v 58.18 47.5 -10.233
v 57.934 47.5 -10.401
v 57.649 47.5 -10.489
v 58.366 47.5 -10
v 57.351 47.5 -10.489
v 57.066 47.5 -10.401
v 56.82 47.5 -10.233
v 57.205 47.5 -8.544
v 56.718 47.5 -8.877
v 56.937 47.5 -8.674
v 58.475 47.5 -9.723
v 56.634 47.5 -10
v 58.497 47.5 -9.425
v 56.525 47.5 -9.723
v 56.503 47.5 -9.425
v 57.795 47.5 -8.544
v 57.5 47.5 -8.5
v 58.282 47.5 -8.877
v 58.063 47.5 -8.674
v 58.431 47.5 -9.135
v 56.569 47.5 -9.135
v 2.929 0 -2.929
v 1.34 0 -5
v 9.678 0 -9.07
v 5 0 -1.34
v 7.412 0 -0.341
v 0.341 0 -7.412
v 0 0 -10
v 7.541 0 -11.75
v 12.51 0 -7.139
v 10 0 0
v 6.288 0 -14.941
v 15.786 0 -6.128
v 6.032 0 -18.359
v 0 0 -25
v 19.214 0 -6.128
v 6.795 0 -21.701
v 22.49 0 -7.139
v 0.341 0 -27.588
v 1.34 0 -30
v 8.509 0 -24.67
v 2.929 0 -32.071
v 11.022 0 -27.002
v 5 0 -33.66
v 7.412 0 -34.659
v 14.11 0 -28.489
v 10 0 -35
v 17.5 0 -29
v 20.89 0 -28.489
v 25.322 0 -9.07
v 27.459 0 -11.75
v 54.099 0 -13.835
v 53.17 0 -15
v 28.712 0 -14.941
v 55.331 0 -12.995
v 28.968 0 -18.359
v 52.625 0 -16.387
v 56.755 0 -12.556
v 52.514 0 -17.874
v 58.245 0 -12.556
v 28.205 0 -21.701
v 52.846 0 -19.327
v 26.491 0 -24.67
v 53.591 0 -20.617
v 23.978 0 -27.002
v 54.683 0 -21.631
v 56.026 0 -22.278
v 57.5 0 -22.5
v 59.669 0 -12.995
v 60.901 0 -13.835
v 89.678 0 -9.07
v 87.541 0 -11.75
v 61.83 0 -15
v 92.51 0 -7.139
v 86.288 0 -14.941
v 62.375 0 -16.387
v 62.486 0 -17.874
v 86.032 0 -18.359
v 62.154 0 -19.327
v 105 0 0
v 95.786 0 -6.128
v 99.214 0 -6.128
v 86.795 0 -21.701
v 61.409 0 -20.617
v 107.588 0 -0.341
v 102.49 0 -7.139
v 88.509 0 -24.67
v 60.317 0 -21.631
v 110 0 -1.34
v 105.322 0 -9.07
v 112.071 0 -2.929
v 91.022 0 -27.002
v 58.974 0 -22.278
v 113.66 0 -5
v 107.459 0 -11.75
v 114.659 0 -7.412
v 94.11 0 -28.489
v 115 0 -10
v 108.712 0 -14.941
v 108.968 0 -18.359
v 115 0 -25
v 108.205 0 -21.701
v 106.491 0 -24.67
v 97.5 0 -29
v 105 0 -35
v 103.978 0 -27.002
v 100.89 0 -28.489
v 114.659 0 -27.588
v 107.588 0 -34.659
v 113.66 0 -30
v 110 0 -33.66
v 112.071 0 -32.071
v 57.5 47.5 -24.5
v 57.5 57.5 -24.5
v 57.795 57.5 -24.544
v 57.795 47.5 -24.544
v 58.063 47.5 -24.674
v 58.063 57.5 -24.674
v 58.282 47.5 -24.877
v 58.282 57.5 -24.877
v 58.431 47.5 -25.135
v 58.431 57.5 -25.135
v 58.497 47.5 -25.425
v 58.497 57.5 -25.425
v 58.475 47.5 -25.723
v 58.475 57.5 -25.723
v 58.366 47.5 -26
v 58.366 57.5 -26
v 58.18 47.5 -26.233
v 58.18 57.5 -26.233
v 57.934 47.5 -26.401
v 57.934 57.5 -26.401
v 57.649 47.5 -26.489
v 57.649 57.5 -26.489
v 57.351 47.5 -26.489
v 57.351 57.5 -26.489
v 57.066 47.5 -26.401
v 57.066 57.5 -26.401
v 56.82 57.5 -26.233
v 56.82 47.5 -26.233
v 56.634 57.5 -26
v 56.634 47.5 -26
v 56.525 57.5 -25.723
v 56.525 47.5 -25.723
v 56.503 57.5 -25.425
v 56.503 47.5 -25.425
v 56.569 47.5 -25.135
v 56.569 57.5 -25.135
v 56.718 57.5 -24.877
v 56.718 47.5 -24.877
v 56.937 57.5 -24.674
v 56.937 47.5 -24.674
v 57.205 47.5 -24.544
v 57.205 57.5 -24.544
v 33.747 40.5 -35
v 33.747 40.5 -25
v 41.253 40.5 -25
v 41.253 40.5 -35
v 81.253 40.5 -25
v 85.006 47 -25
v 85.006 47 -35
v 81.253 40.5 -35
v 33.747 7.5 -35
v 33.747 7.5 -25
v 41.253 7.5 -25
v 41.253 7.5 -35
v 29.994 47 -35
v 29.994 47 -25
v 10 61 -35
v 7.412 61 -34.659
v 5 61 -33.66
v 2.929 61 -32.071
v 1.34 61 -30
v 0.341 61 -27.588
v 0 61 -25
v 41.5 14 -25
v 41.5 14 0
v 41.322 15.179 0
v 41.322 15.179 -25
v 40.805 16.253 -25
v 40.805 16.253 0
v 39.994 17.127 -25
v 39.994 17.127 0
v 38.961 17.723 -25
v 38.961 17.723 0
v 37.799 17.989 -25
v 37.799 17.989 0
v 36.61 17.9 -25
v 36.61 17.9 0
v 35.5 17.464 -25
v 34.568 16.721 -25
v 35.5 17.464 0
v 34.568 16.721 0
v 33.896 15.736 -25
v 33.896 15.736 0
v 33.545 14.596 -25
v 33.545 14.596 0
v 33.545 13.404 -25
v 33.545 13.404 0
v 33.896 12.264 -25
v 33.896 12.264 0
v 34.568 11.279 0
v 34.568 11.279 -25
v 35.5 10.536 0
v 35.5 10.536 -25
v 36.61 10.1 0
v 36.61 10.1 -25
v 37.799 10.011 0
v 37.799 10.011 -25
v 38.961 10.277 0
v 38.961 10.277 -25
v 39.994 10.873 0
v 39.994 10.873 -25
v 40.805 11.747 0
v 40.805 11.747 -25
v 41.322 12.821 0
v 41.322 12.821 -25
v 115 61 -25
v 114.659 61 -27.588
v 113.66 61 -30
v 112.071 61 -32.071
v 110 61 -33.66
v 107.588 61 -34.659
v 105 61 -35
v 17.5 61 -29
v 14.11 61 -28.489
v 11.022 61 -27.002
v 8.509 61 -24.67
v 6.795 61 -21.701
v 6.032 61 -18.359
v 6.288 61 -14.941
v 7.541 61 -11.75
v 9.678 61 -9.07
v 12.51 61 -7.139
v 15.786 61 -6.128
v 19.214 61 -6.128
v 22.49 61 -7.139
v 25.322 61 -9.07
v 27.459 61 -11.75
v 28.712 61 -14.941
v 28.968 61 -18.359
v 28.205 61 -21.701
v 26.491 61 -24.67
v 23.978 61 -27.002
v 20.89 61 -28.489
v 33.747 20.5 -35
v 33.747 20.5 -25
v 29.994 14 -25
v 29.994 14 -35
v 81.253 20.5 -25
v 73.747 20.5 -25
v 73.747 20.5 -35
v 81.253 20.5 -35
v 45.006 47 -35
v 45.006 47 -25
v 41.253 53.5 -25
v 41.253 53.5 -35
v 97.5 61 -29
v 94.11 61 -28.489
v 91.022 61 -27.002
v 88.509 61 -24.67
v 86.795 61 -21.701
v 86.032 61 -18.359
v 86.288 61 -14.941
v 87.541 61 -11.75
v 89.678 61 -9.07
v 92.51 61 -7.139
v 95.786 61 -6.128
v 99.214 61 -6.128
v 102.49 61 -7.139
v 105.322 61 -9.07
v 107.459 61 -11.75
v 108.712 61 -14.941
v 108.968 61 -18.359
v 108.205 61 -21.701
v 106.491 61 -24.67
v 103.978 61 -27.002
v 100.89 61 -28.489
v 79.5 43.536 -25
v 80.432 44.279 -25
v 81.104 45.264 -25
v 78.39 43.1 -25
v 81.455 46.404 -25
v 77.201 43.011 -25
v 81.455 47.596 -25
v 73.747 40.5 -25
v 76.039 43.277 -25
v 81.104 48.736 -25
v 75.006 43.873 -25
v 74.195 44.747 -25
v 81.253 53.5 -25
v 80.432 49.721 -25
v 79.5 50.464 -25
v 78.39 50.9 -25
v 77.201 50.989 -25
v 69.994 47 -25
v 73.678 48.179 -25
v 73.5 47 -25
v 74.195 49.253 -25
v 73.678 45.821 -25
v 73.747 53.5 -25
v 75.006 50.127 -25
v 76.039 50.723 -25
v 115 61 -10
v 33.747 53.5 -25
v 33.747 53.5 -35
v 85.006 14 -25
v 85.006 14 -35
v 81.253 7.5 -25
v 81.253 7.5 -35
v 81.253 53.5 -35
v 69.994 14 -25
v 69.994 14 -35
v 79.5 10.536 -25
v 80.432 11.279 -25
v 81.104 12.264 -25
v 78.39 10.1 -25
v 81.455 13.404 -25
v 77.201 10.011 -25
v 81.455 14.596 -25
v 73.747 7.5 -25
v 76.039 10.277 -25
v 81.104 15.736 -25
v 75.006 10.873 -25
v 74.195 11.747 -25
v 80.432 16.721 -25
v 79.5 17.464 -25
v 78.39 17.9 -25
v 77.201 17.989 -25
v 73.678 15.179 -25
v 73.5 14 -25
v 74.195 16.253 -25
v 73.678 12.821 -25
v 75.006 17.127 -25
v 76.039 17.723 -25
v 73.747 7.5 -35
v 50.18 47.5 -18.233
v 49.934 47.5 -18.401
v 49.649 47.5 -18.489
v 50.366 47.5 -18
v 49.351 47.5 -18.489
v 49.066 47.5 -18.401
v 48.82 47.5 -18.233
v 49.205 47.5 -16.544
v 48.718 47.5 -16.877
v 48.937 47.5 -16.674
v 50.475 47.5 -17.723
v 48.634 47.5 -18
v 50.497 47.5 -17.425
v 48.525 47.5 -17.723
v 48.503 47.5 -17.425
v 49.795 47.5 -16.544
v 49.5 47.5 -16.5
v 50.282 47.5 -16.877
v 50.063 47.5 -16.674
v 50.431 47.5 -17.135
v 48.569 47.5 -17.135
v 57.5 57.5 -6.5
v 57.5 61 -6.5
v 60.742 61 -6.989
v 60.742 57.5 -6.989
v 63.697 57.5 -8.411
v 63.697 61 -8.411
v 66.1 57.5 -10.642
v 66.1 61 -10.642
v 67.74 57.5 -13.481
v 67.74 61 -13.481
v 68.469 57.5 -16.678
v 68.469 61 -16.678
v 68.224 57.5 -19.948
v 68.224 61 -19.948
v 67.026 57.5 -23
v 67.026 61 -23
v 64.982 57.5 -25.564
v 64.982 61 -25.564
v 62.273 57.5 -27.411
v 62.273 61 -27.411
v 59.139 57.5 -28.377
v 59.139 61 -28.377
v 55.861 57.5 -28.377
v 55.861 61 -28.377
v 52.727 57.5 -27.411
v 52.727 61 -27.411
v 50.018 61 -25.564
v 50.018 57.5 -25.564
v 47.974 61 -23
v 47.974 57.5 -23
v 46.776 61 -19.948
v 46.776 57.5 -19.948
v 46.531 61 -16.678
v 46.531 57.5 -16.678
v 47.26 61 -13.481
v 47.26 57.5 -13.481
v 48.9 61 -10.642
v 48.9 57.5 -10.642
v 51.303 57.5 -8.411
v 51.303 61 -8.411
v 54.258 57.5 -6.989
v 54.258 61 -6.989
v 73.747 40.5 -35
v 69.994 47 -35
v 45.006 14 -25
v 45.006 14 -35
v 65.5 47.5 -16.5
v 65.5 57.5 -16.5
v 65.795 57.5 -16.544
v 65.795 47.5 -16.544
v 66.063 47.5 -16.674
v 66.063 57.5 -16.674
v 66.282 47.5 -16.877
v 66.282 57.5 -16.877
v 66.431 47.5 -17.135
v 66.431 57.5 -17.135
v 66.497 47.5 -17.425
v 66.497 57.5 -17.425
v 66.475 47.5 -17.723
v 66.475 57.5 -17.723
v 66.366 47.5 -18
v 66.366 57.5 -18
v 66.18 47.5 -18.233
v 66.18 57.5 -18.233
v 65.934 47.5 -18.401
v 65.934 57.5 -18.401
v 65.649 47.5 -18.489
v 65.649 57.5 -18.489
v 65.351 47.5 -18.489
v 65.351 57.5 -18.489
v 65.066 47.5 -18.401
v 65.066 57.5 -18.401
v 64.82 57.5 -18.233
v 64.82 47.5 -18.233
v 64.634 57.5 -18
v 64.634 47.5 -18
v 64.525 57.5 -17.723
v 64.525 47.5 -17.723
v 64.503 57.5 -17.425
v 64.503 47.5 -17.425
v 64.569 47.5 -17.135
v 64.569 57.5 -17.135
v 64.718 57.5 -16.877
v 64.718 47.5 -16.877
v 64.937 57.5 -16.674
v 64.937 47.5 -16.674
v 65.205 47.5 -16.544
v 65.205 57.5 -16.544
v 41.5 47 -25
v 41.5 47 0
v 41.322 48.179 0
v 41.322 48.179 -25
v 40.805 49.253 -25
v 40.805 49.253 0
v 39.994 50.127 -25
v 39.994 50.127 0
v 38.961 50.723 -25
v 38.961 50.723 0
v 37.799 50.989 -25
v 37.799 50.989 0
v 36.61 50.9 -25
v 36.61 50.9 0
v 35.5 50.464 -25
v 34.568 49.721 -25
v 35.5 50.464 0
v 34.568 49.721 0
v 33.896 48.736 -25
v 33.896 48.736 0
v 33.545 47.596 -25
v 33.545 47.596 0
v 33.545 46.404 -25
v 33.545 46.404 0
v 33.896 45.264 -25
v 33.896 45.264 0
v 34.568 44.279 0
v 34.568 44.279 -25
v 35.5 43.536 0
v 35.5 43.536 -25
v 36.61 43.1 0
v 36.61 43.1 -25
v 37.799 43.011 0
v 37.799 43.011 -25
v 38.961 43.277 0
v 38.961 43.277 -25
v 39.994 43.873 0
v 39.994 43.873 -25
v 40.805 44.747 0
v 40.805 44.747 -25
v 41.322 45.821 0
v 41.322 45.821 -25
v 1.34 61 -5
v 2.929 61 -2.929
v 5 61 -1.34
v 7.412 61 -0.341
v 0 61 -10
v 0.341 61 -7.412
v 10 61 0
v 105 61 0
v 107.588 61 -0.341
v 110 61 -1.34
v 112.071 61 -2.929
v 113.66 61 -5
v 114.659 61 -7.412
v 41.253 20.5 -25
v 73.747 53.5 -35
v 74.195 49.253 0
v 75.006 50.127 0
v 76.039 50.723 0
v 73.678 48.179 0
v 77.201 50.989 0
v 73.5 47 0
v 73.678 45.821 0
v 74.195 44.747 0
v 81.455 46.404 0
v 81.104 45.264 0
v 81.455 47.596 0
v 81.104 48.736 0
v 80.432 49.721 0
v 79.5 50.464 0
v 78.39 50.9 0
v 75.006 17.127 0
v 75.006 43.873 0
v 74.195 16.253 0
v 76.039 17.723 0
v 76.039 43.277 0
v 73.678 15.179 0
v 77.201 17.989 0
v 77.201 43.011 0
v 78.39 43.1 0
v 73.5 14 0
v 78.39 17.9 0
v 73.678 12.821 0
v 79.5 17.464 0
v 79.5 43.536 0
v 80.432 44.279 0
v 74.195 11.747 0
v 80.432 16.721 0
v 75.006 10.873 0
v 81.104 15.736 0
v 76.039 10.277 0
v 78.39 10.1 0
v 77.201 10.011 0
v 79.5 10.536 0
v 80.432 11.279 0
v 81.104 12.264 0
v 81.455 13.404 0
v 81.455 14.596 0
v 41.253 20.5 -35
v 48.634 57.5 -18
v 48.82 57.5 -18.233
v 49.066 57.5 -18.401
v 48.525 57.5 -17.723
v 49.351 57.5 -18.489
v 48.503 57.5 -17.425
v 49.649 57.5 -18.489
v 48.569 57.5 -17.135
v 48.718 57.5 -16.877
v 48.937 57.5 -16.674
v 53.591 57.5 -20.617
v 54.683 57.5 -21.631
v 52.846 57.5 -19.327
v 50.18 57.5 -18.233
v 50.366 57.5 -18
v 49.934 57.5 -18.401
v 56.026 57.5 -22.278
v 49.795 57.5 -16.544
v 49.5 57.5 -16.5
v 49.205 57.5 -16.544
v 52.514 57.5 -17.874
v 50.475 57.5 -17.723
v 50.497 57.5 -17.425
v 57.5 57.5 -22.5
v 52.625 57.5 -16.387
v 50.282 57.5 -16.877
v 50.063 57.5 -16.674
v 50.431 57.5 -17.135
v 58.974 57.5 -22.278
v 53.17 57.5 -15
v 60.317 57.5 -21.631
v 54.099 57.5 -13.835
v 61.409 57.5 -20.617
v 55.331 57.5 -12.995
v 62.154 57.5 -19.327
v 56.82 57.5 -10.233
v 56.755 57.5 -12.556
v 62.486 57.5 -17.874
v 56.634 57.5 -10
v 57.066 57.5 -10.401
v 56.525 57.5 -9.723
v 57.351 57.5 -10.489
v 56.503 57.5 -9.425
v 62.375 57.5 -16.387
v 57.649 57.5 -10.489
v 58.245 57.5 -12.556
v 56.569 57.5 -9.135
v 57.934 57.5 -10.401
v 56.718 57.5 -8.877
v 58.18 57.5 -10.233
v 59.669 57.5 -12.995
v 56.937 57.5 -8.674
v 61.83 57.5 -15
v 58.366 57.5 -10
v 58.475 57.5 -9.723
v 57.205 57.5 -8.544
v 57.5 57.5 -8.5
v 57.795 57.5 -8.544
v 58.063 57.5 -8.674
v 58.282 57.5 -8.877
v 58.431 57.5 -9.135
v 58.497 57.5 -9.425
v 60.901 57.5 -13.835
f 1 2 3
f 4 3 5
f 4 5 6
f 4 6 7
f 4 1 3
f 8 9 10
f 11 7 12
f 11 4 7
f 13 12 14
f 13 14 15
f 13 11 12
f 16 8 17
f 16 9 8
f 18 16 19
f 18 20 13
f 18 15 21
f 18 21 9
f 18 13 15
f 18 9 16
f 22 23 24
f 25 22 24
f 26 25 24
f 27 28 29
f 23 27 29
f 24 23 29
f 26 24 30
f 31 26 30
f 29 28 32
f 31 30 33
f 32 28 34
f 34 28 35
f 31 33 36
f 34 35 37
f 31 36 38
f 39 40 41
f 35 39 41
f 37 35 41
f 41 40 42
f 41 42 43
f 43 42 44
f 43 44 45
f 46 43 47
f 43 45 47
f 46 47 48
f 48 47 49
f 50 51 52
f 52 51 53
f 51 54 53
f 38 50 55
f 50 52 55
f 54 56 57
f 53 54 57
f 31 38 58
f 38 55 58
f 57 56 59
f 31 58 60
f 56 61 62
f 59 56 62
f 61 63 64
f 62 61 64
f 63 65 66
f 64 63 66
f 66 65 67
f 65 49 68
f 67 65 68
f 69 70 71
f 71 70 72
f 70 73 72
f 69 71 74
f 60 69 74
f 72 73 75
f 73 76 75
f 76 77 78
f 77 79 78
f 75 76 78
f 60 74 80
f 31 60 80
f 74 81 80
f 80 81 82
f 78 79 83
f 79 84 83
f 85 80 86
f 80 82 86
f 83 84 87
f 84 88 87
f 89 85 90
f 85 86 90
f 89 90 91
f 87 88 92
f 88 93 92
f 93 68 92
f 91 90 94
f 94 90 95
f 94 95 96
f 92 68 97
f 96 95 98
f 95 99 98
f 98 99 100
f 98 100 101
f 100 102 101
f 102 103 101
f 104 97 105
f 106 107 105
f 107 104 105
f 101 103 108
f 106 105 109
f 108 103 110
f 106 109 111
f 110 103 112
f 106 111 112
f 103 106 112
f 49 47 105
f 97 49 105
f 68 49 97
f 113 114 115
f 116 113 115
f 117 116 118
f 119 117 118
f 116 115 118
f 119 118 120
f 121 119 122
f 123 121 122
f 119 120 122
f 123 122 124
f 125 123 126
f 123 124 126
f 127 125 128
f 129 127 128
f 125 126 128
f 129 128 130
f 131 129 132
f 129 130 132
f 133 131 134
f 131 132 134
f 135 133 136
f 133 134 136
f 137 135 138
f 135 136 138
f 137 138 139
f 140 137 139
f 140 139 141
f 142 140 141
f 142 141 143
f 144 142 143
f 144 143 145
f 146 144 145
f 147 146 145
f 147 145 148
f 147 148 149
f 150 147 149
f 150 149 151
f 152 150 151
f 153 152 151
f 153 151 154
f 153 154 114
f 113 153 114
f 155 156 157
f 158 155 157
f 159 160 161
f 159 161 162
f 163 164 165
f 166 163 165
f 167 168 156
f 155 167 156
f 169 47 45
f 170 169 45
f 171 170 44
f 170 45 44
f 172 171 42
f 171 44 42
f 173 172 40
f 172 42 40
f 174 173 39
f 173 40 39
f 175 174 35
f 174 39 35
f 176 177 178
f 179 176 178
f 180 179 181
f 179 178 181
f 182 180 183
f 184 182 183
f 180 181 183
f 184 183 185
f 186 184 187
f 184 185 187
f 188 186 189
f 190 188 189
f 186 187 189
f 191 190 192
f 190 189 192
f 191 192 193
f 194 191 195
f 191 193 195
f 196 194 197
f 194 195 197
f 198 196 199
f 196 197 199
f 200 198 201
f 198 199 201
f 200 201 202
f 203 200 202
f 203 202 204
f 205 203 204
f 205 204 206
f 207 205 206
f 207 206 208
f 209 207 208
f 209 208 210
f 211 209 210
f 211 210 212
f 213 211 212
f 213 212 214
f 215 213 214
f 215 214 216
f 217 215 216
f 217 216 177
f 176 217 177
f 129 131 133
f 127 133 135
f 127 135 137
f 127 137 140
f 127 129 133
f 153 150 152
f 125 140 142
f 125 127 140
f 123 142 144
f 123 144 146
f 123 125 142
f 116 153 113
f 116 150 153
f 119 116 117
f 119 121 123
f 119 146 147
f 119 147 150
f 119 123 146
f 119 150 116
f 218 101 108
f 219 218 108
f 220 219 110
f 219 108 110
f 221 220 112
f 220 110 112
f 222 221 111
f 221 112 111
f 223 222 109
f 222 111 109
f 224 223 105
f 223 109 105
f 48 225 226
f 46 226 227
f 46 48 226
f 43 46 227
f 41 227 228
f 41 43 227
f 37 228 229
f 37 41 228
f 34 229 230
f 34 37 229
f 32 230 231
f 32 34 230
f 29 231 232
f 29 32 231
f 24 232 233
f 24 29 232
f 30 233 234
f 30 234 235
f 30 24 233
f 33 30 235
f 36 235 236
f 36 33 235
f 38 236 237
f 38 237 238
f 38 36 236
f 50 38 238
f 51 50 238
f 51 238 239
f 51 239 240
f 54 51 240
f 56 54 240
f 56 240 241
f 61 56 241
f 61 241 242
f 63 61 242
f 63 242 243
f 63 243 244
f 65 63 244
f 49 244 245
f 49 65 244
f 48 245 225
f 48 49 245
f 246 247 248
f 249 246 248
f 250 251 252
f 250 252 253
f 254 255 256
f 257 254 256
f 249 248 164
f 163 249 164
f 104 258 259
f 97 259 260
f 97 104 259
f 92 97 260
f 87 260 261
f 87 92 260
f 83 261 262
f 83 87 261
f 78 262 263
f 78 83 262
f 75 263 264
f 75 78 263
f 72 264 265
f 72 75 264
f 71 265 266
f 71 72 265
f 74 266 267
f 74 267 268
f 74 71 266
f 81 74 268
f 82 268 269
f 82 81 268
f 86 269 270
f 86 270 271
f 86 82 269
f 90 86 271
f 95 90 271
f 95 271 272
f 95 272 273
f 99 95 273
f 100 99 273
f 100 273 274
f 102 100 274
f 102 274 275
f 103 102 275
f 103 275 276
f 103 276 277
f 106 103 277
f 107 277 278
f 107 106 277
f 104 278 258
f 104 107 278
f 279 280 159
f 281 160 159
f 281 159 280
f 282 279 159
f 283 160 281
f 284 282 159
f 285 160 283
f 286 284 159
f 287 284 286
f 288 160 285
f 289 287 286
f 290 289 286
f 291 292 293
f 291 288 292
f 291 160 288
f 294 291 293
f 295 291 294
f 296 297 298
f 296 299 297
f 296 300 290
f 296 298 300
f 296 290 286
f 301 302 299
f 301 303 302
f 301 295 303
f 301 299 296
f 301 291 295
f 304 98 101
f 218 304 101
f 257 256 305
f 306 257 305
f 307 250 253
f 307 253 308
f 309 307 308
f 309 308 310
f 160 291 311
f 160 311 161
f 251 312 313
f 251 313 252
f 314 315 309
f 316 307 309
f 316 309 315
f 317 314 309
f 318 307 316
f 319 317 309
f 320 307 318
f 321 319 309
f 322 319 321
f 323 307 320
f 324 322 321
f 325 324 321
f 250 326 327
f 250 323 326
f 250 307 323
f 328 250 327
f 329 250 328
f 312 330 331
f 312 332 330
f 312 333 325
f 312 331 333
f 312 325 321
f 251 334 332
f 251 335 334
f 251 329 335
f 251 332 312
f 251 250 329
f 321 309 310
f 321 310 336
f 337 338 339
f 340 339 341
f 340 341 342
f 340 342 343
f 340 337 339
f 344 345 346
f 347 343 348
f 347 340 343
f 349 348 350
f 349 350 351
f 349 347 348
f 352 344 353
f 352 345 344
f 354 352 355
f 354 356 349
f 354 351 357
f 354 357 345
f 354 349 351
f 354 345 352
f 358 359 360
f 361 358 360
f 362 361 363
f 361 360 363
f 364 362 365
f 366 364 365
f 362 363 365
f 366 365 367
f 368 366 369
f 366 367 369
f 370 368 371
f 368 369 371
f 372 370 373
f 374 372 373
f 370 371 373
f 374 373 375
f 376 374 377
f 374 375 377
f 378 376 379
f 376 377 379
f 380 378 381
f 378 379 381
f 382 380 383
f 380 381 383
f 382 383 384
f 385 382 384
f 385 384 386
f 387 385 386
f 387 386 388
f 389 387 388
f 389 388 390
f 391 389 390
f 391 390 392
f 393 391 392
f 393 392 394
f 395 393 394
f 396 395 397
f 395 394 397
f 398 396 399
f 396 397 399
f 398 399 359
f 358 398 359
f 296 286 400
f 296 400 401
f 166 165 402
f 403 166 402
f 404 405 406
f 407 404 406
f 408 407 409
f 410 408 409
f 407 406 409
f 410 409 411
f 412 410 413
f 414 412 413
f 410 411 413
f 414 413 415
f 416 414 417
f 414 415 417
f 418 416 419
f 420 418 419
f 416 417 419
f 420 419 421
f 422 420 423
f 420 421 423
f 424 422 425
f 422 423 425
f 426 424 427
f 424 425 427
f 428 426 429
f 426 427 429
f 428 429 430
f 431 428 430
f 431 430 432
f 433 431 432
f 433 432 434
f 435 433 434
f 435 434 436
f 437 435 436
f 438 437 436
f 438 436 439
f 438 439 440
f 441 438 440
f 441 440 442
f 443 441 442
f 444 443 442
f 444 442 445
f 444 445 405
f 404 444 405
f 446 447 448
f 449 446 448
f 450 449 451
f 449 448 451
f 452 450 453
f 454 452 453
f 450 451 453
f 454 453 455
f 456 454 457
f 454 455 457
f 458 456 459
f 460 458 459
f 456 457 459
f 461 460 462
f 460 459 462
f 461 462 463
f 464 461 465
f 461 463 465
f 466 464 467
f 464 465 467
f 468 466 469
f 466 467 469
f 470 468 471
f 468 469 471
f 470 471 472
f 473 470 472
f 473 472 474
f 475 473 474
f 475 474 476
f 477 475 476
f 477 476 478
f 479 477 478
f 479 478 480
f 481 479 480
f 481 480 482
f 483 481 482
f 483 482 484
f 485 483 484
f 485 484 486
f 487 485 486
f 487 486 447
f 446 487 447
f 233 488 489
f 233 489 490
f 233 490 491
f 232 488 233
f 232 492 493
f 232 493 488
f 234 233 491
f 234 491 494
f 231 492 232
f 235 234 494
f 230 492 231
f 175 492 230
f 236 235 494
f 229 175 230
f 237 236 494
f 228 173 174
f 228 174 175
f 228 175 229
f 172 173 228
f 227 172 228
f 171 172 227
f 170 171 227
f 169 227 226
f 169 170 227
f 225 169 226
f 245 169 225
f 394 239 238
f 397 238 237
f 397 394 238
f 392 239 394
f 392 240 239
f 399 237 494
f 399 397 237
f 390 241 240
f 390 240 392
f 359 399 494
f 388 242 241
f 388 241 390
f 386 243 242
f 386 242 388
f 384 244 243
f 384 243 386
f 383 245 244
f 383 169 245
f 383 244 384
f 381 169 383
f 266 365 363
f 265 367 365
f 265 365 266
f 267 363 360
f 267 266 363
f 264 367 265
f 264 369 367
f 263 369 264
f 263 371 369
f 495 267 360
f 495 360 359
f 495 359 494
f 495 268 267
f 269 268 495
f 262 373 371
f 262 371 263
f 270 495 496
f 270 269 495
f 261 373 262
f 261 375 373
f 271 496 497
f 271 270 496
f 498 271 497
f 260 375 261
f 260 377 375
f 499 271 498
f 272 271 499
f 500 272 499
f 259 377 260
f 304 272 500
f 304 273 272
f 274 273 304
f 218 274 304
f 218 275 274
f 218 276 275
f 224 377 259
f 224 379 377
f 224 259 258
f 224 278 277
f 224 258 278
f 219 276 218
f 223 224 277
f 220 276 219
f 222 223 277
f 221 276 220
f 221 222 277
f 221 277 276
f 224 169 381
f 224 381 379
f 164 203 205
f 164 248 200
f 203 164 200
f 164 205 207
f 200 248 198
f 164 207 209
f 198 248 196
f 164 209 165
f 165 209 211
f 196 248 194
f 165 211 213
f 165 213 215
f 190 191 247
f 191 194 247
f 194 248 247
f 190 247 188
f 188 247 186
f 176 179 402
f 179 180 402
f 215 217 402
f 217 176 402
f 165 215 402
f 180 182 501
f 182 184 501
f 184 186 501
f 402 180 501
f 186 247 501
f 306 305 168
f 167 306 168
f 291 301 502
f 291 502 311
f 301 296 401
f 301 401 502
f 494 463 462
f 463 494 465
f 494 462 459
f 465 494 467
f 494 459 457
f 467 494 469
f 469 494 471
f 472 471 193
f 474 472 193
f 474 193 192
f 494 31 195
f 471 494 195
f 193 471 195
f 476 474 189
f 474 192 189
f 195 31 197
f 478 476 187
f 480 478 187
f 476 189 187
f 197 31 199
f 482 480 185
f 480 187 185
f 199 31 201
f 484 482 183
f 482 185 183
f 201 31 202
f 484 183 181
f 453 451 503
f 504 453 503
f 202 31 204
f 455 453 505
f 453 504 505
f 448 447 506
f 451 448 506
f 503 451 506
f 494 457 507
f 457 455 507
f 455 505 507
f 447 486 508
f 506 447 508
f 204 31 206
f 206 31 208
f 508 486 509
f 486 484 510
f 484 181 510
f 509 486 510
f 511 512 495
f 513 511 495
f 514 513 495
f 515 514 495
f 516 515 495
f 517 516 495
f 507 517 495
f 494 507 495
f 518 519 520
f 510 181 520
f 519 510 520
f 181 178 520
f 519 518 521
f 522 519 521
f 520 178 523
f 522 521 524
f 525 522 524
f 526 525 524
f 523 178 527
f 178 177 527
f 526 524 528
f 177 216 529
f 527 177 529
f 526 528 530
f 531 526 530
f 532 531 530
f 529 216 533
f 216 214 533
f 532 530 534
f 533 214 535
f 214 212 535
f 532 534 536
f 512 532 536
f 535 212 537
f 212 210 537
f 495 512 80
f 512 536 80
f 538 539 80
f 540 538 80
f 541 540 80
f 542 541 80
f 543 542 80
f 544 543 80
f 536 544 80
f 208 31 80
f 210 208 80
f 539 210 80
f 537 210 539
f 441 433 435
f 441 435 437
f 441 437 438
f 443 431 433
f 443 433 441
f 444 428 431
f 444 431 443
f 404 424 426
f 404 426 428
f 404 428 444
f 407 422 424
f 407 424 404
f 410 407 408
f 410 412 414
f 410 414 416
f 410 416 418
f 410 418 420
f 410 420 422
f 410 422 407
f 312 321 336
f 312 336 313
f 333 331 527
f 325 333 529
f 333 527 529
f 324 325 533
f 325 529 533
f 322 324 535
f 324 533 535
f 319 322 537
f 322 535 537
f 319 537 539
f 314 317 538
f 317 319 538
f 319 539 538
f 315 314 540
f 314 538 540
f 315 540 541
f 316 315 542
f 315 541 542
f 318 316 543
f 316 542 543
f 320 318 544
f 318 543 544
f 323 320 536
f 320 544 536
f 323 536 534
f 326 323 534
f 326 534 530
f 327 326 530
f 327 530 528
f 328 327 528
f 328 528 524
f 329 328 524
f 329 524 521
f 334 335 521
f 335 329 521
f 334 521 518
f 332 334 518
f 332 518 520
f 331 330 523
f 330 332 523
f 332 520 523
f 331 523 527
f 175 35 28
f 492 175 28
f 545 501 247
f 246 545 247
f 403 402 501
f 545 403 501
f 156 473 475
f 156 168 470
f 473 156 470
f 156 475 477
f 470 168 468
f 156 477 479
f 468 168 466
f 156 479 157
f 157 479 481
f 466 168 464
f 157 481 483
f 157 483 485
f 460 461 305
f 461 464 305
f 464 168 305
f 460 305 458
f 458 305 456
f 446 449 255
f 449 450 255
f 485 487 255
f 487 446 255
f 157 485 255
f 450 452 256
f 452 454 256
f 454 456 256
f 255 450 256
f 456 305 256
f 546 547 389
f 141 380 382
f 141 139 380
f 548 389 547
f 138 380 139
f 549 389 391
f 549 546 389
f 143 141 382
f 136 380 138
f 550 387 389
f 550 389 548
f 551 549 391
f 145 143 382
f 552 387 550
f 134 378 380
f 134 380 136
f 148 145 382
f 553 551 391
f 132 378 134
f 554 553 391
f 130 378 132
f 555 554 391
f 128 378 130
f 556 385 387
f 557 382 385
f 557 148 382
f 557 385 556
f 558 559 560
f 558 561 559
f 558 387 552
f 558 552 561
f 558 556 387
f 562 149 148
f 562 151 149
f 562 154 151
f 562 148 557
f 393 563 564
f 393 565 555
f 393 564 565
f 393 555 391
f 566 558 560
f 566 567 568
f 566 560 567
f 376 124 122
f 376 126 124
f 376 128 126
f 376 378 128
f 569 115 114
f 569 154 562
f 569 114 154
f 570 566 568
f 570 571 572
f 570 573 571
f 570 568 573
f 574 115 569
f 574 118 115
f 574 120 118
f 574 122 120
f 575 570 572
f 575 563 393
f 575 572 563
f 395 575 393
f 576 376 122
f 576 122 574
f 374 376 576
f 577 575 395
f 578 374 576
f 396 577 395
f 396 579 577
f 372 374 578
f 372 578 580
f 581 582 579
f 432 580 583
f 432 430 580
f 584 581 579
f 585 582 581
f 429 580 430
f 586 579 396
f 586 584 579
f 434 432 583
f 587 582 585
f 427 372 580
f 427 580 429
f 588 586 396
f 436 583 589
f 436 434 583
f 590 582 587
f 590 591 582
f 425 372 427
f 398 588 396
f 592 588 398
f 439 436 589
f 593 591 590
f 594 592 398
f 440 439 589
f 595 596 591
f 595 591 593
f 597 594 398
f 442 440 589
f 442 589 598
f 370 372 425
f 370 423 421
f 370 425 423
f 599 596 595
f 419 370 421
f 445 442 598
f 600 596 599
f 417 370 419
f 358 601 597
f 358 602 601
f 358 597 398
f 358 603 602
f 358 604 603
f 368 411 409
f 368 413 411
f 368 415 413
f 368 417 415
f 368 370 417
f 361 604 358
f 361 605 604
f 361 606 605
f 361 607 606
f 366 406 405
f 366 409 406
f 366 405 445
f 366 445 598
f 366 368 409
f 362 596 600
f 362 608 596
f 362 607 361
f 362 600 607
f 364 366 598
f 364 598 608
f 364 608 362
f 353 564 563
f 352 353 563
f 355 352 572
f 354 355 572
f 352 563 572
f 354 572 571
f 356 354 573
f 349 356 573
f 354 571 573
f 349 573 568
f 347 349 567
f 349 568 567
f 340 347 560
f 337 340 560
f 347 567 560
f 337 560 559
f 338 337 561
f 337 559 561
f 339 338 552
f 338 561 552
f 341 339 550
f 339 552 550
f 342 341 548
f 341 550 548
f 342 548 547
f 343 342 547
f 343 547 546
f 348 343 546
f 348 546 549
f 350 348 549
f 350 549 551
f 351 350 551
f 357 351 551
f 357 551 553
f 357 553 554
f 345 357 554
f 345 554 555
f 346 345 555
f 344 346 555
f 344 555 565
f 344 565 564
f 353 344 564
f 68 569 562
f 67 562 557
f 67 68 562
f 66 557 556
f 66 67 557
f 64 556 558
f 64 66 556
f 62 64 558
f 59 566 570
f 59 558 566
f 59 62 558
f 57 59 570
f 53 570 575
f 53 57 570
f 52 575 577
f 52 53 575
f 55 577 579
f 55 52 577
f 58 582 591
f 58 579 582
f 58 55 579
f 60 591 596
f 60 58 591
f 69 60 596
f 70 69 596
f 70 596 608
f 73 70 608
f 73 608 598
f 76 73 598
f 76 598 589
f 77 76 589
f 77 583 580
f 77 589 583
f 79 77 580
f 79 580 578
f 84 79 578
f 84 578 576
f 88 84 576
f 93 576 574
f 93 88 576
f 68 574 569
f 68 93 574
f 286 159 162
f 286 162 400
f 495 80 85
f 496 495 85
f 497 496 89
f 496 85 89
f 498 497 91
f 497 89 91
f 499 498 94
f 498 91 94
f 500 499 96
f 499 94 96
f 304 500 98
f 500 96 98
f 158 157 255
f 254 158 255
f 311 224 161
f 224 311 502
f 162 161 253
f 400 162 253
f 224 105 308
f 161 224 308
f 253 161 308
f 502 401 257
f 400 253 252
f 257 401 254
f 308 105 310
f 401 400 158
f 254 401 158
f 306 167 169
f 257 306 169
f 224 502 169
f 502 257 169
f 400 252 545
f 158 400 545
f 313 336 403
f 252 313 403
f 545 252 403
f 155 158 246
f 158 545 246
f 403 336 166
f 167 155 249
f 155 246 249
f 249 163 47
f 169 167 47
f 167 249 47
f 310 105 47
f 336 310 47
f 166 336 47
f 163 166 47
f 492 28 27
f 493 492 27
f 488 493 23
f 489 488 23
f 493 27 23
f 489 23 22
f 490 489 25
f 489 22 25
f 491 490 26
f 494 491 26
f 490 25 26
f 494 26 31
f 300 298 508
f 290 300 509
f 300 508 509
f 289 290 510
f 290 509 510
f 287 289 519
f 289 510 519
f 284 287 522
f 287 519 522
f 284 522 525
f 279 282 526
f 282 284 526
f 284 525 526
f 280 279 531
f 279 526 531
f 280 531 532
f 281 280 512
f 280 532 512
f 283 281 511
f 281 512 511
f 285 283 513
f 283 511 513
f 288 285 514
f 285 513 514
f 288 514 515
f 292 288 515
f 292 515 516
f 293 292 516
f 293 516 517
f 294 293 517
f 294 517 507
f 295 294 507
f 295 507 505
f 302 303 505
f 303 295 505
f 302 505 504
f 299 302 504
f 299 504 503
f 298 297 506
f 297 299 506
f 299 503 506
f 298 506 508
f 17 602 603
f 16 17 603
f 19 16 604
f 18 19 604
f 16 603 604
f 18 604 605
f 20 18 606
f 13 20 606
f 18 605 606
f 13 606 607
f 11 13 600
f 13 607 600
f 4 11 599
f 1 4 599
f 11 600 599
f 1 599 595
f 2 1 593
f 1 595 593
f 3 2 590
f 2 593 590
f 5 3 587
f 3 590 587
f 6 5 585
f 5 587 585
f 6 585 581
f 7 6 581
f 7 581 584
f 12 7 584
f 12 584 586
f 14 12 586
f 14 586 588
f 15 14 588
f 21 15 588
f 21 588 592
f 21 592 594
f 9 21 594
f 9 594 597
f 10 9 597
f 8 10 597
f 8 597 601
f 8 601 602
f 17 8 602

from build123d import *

# Parameters (mm, degrees)
SKETCH1_R           = 11.5
SKETCH1_R_2         = 5
BOSS_EXTRUDE1_DEPTH = 61
SKETCH2_R           = 11
SKETCH2_R_2         = 1
CUT_EXTRUDE1_DEPTH  = 3.5
SKETCH2_2_R         = 1
CUT_EXTRUDE2_DEPTH  = 13.5
SKETCH4_R           = 4
CUT_EXTRUDE3_DEPTH  = 135.799851632
CUT_EXTRUDE4_START  = -25
SKETCH4_3_R         = 4
CUT_EXTRUDE4_DEPTH  = 10


with BuildPart() as part:
    # Sketch1 → Boss-Extrude1 (new body)
    with BuildSketch(Plane(origin=(0, 0, 0), x_dir=(1, 0, 0), z_dir=(0, 1, 0))):
        with BuildLine():
            Line((10, 0), (105, 0))
            ThreePointArc((105, 0), (112.071067812, 2.928932188), (115, 10))
            Line((115, 10), (115, 25))
            ThreePointArc((115, 25), (112.071067812, 32.071067812), (105, 35))
            Line((105, 35), (10, 35))
            ThreePointArc((10, 35), (2.928932188, 32.071067812), (0, 25))
            Line((0, 25), (0, 10))
            ThreePointArc((0, 10), (2.928932188, 2.928932188), (10, 0))
        make_face()
        with Locations(Location((17.5, 17.5, 0), (0, 0, 90))):
            Circle(SKETCH1_R, mode=Mode.SUBTRACT)
        with Locations(Location((57.5, 17.5, 0), (0, 0, 90))):
            Circle(SKETCH1_R_2, mode=Mode.SUBTRACT)
        with Locations(Location((97.5, 17.5, 0), (0, 0, 90))):
            Circle(SKETCH1_R, mode=Mode.SUBTRACT)
    extrude(amount=BOSS_EXTRUDE1_DEPTH)

    # Sketch2 → Cut-Extrude1 (cut)
    with BuildSketch(Plane(origin=(0, 61, 0), x_dir=(1, 0, 0), z_dir=(0, 1, 0))):
        with Locations(Location((57.5, 17.5, 0), (0, 0, 270))):
            Circle(SKETCH2_R)
        with Locations(Location((57.5, 25.5, 0), (0, 0, 270))):
            Circle(SKETCH2_R_2, mode=Mode.SUBTRACT)
        with Locations(Location((65.5, 17.5, 0), (0, 0, 270))):
            Circle(SKETCH2_R_2, mode=Mode.SUBTRACT)
        with Locations(Location((57.5, 9.5, 0), (0, 0, 270))):
            Circle(SKETCH2_R_2, mode=Mode.SUBTRACT)
        with Locations(Location((49.5, 17.5, 0), (0, 0, 270))):
            Circle(SKETCH2_R_2, mode=Mode.SUBTRACT)
    extrude(amount=-CUT_EXTRUDE1_DEPTH, mode=Mode.SUBTRACT)

    # Sketch2<2> → Cut-Extrude2 (cut)
    with BuildSketch(Plane(origin=(0, 61, 0), x_dir=(1, 0, 0), z_dir=(0, 1, 0))):
        with Locations(Location((57.5, 25.5, 0), (0, 0, 270))):
            Circle(SKETCH2_2_R)
        with Locations(Location((65.5, 17.5, 0), (0, 0, 270))):
            Circle(SKETCH2_2_R)
        with Locations(Location((57.5, 9.5, 0), (0, 0, 270))):
            Circle(SKETCH2_2_R)
        with Locations(Location((49.5, 17.5, 0), (0, 0, 270))):
            Circle(SKETCH2_2_R)
    extrude(amount=-CUT_EXTRUDE2_DEPTH, mode=Mode.SUBTRACT)

    # Sketch4 → Cut-Extrude3 (cut, through all)
    with BuildSketch(Plane.XY):
        with Locations((37.5, 47)):
            Circle(SKETCH4_R)
        with Locations((37.5, 14)):
            Circle(SKETCH4_R)
        with Locations(Location((77.5, 14, 0), (0, 0, 180))):
            Circle(SKETCH4_R)
        with Locations(Location((77.5, 47, 0), (0, 0, 180))):
            Circle(SKETCH4_R)
    extrude(amount=-CUT_EXTRUDE3_DEPTH, mode=Mode.SUBTRACT)

    # Sketch4<3> → Cut-Extrude4 (cut)
    # profile 1 of 4: a face of its own
    with BuildSketch(Plane.XY.offset(CUT_EXTRUDE4_START)):
        Polygon((81.25277675, 20.5), (85.005553499, 14), (81.25277675, 7.5), (73.74722325, 7.5), (69.994446501, 14), (73.74722325, 20.5), align=None)
        with Locations((77.5, 14)):
            Circle(SKETCH4_3_R, mode=Mode.SUBTRACT)
    # profile 2 of 4: a face of its own
    with BuildSketch(Plane.XY.offset(CUT_EXTRUDE4_START)):
        Polygon((29.994446501, 47), (33.74722325, 40.5), (41.25277675, 40.5), (45.005553499, 47), (41.25277675, 53.5), (33.74722325, 53.5), align=None)
        with Locations((37.5, 47)):
            Circle(SKETCH4_3_R, mode=Mode.SUBTRACT)
    # profile 3 of 4: a face of its own
    with BuildSketch(Plane.XY.offset(CUT_EXTRUDE4_START)):
        Polygon((29.994446501, 14), (33.74722325, 7.5), (41.25277675, 7.5), (45.005553499, 14), (41.25277675, 20.5), (33.74722325, 20.5), align=None)
        with Locations((37.5, 14)):
            Circle(SKETCH4_3_R, mode=Mode.SUBTRACT)
    # profile 4 of 4: a face of its own
    with BuildSketch(Plane.XY.offset(CUT_EXTRUDE4_START)):
        Polygon((81.25277675, 53.5), (85.005553499, 47), (81.25277675, 40.5), (73.74722325, 40.5), (69.994446501, 47), (73.74722325, 53.5), align=None)
        with Locations((77.5, 47)):
            Circle(SKETCH4_3_R, mode=Mode.SUBTRACT)
    extrude(amount=-CUT_EXTRUDE4_DEPTH, mode=Mode.SUBTRACT)


solid = part.part
